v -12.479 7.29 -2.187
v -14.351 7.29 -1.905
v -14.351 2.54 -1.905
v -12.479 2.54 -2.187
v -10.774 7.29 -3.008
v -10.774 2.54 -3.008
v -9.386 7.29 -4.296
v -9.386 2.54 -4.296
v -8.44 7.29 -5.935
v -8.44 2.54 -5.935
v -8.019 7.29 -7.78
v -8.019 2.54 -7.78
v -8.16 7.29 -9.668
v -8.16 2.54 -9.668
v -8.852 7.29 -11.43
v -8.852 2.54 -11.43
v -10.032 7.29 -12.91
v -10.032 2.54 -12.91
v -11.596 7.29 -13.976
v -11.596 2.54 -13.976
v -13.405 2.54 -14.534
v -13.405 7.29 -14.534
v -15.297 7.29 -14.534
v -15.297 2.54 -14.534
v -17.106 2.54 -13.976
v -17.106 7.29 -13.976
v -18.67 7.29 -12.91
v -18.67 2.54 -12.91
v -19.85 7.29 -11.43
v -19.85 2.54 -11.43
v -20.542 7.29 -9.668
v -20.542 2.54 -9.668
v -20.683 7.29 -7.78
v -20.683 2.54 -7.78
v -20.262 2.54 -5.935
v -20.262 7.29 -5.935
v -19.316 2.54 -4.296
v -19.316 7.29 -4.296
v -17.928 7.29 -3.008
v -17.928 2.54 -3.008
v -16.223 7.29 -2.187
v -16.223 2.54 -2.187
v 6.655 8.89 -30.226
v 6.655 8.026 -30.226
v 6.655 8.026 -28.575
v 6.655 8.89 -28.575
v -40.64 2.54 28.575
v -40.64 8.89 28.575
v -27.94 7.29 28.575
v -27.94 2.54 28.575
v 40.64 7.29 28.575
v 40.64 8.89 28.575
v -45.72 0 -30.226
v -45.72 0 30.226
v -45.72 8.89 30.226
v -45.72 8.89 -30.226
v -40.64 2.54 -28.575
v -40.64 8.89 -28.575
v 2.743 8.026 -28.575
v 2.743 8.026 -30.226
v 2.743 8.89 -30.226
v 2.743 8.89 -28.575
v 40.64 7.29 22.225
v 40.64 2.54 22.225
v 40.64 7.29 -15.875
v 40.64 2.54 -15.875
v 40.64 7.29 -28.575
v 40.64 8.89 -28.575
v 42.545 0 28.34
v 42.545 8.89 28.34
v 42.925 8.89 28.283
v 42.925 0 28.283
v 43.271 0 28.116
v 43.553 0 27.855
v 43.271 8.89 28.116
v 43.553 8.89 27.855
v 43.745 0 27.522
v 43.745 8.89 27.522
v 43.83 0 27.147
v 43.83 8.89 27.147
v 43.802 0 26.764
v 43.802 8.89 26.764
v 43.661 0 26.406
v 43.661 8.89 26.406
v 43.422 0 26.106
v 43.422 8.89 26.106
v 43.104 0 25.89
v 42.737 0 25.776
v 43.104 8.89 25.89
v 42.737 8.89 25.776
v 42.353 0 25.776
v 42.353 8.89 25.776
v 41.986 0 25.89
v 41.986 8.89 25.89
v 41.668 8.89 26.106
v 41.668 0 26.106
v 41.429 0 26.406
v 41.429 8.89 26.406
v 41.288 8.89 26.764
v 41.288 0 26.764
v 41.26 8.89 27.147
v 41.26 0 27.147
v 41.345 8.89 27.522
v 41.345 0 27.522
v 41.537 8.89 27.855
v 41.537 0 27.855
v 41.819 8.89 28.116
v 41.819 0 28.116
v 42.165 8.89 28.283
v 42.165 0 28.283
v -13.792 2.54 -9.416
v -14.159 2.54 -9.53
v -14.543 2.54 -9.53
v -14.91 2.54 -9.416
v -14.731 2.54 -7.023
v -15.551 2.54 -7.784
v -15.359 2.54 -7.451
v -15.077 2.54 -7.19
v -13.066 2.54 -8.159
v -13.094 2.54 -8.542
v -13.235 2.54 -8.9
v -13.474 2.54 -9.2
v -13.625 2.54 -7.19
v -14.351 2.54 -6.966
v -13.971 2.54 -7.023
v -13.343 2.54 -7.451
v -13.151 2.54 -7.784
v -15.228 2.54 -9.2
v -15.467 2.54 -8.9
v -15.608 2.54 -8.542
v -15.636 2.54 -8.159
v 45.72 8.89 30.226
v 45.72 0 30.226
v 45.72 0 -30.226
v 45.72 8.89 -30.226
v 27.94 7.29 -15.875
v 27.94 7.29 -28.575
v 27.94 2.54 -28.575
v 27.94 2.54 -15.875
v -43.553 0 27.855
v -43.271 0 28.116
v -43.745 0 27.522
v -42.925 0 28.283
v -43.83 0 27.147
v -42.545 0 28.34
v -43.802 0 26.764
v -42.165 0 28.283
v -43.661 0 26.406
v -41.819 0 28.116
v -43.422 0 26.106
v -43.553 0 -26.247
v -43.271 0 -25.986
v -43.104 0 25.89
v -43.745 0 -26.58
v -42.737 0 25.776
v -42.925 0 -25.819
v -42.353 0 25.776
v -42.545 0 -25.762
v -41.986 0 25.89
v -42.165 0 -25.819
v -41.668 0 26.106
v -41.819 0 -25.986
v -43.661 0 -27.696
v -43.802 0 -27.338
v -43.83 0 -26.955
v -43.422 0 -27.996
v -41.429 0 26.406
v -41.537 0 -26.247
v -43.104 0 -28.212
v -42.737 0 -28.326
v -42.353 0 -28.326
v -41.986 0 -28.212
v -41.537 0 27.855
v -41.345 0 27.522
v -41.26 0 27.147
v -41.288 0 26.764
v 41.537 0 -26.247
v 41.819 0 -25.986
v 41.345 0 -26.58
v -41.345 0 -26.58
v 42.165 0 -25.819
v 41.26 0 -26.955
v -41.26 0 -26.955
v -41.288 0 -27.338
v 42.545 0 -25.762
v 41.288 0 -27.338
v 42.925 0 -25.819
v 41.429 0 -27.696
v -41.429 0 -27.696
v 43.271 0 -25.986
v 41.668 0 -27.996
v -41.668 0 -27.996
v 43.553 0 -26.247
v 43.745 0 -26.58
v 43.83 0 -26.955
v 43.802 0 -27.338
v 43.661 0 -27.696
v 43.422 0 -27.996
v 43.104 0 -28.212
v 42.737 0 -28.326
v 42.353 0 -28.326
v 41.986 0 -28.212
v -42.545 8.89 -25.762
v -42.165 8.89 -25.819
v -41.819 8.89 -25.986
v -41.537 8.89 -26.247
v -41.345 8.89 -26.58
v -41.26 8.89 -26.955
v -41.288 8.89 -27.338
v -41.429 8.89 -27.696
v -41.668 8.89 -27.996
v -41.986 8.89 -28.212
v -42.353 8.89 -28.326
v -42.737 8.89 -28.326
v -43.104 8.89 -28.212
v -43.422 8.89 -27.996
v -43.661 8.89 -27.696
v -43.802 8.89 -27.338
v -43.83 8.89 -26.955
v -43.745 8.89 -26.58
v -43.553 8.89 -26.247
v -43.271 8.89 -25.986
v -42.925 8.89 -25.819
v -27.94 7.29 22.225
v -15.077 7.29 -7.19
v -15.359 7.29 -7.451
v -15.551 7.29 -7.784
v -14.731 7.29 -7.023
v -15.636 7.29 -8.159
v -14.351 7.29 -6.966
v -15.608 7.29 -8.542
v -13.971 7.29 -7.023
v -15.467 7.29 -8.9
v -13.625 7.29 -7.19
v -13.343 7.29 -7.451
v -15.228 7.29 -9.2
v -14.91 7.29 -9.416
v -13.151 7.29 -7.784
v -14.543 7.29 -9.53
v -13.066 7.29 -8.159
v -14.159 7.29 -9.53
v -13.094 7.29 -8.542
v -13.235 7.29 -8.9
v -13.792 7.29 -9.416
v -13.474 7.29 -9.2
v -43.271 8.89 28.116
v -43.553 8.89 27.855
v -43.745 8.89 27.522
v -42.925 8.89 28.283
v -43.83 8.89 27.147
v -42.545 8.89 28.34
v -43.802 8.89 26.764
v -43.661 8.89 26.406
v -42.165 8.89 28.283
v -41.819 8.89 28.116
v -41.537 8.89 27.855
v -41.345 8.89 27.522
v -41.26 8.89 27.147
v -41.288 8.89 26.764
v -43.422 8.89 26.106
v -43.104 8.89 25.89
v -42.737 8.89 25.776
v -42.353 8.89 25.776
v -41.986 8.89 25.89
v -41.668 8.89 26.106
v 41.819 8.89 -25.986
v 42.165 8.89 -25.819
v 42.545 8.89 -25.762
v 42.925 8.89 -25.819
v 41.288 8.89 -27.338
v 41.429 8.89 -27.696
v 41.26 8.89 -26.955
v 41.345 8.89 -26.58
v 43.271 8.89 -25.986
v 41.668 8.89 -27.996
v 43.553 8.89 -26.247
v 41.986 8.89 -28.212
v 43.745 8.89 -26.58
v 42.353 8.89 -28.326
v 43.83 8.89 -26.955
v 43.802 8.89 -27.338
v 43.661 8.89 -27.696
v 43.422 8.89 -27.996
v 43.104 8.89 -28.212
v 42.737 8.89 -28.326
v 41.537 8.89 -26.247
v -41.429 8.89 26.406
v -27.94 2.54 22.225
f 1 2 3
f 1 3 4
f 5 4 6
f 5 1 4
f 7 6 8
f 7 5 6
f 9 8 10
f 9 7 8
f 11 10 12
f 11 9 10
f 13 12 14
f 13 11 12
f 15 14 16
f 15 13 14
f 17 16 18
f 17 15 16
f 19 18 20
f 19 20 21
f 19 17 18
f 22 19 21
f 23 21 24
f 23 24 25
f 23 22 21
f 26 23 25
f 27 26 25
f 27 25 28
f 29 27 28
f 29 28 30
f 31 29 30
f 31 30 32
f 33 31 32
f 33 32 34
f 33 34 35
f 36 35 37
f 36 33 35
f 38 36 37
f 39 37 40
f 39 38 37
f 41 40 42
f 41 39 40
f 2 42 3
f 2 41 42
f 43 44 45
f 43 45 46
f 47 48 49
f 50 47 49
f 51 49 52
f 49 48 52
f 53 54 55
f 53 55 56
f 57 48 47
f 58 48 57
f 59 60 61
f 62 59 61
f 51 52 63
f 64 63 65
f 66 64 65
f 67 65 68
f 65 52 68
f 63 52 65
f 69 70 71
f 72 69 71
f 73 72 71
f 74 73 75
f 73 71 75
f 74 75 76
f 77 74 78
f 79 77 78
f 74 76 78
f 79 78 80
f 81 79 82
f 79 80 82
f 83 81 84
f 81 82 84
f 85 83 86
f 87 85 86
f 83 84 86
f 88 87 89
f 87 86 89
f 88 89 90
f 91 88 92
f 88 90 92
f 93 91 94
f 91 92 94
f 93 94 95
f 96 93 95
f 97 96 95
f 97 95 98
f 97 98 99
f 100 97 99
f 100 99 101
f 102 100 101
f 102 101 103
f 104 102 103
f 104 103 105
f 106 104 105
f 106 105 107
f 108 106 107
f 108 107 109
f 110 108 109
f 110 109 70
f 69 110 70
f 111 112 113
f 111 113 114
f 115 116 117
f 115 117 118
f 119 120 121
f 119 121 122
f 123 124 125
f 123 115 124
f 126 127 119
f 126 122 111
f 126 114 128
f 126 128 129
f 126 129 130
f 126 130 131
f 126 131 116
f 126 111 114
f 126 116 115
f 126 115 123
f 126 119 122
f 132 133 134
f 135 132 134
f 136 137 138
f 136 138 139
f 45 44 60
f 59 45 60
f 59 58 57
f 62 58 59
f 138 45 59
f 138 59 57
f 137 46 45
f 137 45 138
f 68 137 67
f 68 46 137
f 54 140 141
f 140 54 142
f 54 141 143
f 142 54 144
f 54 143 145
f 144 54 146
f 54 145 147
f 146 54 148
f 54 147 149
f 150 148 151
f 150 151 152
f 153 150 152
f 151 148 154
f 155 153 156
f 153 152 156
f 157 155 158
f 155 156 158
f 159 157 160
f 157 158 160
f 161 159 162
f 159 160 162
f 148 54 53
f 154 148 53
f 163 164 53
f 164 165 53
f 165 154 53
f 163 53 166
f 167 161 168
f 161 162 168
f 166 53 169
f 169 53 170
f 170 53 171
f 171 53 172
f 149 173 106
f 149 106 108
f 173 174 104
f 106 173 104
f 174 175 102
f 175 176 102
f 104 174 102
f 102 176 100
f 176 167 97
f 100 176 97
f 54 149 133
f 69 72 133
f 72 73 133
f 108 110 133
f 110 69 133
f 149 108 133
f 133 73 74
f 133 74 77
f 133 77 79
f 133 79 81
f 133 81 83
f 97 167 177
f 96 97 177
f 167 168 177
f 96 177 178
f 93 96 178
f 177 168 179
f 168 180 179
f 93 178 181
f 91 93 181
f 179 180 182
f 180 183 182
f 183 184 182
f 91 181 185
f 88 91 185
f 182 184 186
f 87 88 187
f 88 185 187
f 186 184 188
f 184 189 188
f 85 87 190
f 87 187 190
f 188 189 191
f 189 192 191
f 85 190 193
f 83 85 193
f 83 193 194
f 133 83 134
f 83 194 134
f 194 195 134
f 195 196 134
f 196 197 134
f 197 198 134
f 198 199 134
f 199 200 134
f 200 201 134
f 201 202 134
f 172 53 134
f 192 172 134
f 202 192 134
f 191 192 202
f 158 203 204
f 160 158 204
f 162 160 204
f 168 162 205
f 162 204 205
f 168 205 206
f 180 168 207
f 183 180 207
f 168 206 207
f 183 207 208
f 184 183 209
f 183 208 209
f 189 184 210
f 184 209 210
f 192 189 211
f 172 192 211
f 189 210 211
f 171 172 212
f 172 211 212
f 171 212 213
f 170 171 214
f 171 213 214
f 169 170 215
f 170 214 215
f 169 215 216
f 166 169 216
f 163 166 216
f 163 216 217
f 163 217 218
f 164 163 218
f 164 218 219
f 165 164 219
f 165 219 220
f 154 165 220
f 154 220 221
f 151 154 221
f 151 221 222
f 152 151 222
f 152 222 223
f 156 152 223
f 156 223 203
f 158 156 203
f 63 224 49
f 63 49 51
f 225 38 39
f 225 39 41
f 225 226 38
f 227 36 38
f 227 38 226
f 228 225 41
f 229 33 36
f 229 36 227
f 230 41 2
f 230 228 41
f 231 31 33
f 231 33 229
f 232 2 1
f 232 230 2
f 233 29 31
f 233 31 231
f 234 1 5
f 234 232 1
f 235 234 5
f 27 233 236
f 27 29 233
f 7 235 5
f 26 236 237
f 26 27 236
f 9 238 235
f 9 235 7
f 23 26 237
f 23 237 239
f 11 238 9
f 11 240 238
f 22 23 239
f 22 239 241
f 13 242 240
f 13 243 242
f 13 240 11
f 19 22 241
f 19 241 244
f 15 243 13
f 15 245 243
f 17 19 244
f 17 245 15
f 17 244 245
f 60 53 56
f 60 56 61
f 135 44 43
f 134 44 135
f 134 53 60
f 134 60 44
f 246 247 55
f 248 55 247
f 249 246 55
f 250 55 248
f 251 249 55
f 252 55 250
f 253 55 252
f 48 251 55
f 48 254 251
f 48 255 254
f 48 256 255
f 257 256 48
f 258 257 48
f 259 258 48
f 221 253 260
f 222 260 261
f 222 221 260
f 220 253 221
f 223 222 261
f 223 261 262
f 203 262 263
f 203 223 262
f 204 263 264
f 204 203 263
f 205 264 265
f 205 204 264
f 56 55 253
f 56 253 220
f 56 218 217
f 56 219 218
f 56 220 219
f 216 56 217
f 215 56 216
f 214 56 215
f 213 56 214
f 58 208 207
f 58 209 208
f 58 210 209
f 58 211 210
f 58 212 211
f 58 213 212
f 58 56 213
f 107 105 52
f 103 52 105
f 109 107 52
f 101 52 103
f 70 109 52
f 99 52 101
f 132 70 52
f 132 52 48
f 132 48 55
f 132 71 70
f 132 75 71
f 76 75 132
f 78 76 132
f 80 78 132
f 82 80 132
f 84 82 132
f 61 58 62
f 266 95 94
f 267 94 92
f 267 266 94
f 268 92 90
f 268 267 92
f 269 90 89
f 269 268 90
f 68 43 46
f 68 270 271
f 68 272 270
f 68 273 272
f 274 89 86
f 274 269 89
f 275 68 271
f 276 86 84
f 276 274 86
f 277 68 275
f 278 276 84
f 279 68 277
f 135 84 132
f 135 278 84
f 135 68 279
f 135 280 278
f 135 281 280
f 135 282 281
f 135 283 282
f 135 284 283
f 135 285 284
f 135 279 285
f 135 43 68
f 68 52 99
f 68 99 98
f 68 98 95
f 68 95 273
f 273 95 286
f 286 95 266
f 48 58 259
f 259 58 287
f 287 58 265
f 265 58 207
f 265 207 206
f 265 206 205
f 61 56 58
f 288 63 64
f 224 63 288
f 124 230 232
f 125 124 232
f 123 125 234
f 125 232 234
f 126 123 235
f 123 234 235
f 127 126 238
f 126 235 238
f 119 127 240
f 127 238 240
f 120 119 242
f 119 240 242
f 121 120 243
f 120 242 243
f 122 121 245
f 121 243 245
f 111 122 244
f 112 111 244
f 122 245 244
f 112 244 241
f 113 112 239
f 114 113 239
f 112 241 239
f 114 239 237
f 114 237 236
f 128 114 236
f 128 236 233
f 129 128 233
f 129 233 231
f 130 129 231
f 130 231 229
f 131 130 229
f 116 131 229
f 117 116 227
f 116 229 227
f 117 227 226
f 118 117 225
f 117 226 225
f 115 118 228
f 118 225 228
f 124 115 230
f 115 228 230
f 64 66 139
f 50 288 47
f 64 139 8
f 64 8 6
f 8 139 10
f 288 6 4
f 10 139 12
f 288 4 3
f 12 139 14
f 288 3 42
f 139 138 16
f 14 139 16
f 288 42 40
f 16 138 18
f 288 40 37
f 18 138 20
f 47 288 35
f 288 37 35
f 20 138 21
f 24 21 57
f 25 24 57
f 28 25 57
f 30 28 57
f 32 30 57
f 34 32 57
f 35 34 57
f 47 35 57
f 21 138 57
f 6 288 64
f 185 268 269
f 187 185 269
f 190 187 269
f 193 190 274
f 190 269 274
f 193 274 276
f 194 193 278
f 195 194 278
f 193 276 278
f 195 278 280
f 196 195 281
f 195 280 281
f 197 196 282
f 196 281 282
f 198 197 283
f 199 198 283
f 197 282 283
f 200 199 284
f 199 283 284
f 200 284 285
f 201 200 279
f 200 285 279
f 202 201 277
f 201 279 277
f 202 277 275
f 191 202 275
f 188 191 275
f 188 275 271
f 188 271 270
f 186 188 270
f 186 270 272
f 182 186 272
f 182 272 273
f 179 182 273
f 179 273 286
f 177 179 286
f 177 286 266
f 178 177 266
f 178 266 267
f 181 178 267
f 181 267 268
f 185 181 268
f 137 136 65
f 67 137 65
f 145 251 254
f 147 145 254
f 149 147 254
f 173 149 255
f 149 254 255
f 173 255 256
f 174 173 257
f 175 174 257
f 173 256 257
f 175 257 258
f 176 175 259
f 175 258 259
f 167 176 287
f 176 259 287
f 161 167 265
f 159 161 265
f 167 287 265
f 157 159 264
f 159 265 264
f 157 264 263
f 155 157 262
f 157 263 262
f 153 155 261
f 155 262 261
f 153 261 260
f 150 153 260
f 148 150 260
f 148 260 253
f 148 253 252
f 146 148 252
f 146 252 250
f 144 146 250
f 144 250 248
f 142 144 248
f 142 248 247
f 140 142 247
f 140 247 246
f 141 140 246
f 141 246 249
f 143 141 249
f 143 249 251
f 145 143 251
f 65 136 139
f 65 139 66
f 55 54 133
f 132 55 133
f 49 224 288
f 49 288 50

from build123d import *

# Parameters (mm, degrees)
SKETCH1_W           = 91.44
SKETCH1_H           = 60.452
BOSS_EXTRUDE1_DEPTH = 8.89
SKETCH2_W           = 81.28
SKETCH2_H           = 57.15
CUT_EXTRUDE1_DEPTH  = 1.6002
SKETCH3_R           = 6.35
SKETCH3_R_2         = 1.28905
CUT_EXTRUDE2_DEPTH  = 4.7498
SKETCH4_R           = 1.28905
CUT_EXTRUDE3_DEPTH  = 56.524423239
CUT_EXTRUDE4_REACH  = 78.314
SKETCH5_W           = 3.9116
SKETCH5_H           = 0.8636


with BuildPart() as part:
    # Sketch1 → Boss-Extrude1 (new body)
    with BuildSketch(Plane(origin=(0, 0, 0), x_dir=(1, 0, 0), z_dir=(0, 1, 0))):
        Rectangle(SKETCH1_W, SKETCH1_H)
    extrude(amount=BOSS_EXTRUDE1_DEPTH)

    # Sketch2 → Cut-Extrude1 (cut)
    with BuildSketch(Plane(origin=(0, 8.89, 0), x_dir=(1, 0, 0), z_dir=(0, 1, 0))):
        Rectangle(SKETCH2_W, SKETCH2_H)
    extrude(amount=-CUT_EXTRUDE1_DEPTH, mode=Mode.SUBTRACT)

    # Sketch3 → Cut-Extrude2 (cut)
    with BuildSketch(Plane(origin=(0, 7.2898, 0), x_dir=(1, 0, 0), z_dir=(0, 1, 0))):
        Polygon((-40.64, 28.575), (27.94, 28.575), (27.94, 15.875), (40.64, 15.875), (40.64, -22.225), (-27.94, -22.225), (-27.94, -28.575), (-40.64, -28.575), (-40.64, -22.225), align=None)
        with Locations(Location((-14.351, 8.255, 0), (0, 0, 270))):
            Circle(SKETCH3_R, mode=Mode.SUBTRACT)
        with Locations(Location((-14.351, 8.255, 0), (0, 0, 270))):
            Circle(SKETCH3_R_2)
    extrude(amount=-CUT_EXTRUDE2_DEPTH, mode=Mode.SUBTRACT)

    # Sketch4 → Cut-Extrude3 (cut, through all)
    with BuildSketch(Plane(origin=(0, 8.89, 0), x_dir=(1, 0, 0), z_dir=(0, 1, 0))):
        with Locations(Location((-42.545, 27.051, 0), (0, 0, 270))):
            Circle(SKETCH4_R)
        with Locations(Location((-42.545, -27.051, 0), (0, 0, 270))):
            Circle(SKETCH4_R)
        with Locations(Location((42.545, -27.051, 0), (0, 0, 270))):
            Circle(SKETCH4_R)
        with Locations(Location((42.545, 27.051, 0), (0, 0, 270))):
            Circle(SKETCH4_R)
    extrude(amount=-CUT_EXTRUDE3_DEPTH, mode=Mode.SUBTRACT)

    # Sketch5 → Cut-Extrude4 (cut, up to next)
    with BuildSketch(Plane(origin=(0, 0, -30.226), x_dir=(-1, 0, 0), z_dir=(0, 0, -1)), mode=Mode.PRIVATE) as cut_extrude4_sk1:
        with Locations((-4.699, 8.4582)):
            Rectangle(SKETCH5_W, SKETCH5_H)
    cut_extrude4_tool1 = extrude(cut_extrude4_sk1.sketch, amount=-CUT_EXTRUDE4_REACH, mode=Mode.PRIVATE) & part.part
    add(cut_extrude4_tool1.solids().sort_by_distance((4.699, 8.4582, -30.226))[0], mode=Mode.SUBTRACT)


solid = part.part
